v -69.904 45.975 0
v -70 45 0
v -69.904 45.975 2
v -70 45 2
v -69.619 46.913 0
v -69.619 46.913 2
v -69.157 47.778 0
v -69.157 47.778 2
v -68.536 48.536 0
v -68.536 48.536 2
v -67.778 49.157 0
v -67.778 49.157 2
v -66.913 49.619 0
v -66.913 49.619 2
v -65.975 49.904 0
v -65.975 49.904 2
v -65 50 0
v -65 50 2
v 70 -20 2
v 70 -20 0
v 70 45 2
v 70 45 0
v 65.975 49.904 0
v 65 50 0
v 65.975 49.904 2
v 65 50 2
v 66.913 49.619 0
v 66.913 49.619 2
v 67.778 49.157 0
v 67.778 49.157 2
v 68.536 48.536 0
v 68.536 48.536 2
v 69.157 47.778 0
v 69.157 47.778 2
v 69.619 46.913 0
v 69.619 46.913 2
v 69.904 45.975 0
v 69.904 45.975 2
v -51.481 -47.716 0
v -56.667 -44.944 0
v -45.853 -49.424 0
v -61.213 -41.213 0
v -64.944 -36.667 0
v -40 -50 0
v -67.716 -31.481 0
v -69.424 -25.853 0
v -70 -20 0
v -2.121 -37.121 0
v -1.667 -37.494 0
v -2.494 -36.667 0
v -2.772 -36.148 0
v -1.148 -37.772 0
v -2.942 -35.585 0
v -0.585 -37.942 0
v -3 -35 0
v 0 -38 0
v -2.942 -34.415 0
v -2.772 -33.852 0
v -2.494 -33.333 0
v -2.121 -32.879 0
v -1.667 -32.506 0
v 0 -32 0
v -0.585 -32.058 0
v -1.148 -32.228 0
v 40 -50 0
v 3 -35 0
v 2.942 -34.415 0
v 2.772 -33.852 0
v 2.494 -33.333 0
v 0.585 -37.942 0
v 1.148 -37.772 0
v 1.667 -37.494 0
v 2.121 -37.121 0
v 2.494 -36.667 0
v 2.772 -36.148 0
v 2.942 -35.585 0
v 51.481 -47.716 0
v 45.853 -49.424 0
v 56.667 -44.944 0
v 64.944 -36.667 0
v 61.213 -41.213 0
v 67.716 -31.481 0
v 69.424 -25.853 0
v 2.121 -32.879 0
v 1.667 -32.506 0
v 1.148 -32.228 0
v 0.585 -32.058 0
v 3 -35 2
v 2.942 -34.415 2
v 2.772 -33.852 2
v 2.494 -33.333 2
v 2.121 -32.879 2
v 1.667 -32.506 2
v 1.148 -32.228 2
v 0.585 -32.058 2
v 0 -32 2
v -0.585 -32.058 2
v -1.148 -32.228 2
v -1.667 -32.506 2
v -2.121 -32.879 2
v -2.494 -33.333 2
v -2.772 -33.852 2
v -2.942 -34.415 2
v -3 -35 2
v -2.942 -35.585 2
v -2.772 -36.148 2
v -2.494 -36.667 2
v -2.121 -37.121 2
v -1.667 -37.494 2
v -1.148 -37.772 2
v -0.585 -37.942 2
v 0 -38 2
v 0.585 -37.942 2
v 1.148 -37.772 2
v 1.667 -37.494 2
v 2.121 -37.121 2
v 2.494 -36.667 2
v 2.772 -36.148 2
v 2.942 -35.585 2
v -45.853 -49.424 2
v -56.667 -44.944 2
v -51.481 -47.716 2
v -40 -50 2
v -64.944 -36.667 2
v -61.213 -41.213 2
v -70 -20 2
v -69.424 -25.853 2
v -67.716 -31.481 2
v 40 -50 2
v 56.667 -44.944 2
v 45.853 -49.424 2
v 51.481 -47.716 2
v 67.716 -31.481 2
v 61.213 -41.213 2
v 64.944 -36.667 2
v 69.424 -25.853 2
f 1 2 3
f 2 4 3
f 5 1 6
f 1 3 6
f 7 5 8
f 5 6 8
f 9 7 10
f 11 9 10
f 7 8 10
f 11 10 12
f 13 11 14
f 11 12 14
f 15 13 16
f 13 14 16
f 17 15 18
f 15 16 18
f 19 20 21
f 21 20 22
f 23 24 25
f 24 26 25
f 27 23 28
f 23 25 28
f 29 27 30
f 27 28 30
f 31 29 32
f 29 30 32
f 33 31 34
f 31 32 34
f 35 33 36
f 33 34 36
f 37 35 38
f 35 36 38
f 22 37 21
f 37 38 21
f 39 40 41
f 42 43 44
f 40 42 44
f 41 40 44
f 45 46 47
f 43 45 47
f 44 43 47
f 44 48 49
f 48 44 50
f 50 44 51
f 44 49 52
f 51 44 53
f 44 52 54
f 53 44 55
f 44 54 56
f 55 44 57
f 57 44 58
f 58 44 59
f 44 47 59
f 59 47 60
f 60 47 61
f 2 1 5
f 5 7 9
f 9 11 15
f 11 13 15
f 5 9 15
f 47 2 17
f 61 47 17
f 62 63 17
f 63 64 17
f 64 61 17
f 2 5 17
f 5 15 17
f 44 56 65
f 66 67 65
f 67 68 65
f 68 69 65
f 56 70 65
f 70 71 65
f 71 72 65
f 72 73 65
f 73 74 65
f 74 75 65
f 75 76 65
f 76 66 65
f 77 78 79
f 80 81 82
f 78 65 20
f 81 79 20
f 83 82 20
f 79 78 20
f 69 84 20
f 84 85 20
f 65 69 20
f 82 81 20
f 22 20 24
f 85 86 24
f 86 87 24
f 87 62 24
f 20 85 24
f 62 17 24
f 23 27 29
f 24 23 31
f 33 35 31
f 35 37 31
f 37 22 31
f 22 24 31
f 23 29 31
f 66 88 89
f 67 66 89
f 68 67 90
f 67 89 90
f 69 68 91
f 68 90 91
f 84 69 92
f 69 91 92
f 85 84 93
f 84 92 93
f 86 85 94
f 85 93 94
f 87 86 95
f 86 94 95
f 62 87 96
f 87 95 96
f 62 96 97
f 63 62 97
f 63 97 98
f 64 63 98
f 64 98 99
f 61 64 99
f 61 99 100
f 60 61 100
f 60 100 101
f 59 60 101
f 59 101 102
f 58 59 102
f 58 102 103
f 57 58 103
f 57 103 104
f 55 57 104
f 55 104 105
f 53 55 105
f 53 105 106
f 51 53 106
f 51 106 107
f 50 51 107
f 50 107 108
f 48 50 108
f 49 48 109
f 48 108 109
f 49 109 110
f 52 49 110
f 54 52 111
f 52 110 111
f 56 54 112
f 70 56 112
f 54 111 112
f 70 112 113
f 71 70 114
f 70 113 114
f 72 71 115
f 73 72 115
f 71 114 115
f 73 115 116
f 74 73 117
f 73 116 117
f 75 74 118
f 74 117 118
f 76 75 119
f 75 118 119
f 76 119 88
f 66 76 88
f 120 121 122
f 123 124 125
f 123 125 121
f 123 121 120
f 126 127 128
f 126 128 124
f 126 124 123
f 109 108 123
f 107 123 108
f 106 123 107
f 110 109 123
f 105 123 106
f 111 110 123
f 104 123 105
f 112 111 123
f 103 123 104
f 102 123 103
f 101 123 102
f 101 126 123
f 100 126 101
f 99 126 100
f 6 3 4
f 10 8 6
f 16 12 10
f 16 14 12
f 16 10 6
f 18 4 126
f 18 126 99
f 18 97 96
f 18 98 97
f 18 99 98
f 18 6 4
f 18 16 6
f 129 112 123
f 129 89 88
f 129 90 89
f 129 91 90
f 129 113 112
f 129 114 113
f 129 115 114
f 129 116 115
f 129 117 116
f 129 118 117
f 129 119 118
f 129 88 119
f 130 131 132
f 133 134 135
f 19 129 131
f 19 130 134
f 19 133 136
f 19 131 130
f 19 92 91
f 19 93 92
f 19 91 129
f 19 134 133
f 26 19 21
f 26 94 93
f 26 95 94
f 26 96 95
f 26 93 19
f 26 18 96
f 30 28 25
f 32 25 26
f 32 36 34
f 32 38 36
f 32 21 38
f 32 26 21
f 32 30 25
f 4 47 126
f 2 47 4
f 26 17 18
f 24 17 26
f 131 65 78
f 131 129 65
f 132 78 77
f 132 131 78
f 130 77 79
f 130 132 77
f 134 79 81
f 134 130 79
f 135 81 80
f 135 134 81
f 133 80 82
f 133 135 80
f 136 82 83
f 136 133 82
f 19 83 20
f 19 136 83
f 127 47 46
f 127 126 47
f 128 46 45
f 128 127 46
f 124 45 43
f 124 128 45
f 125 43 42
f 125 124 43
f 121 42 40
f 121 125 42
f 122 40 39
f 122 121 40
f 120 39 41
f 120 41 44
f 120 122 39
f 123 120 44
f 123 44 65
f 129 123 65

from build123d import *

# Parameters (mm, degrees)
F0_W     = 140
F0_H     = 100
F1_DEPTH = 2
F2_R     = 30
F3_R     = 3
F4_DEPTH = 25
F5_R     = 5


with BuildPart() as f1:
    # F0 (on Top) → F1 (new body)
    with BuildSketch(Plane.XY):
        Rectangle(F0_W, F0_H)
    extrude(amount=F1_DEPTH)

    # F2
    f2_edges = [f1.edges().sort_by_distance(p)[0] for p in [
        (-70, -50, 1),
        (70, -50, 1),
    ]]
    fillet(f2_edges, radius=F2_R)

    # F3 (on face) → F4 (cut)
    with BuildSketch(Plane.XY.offset(2)):
        with Locations((0, -35)):
            Circle(F3_R)
    extrude(amount=-F4_DEPTH, mode=Mode.SUBTRACT)

    # F5
    f5_edges = [f1.edges().sort_by_distance(p)[0] for p in [
        (70, 50, 1),
        (-70, 50, 1),
    ]]
    fillet(f5_edges, radius=F5_R)


solid = f1.part
